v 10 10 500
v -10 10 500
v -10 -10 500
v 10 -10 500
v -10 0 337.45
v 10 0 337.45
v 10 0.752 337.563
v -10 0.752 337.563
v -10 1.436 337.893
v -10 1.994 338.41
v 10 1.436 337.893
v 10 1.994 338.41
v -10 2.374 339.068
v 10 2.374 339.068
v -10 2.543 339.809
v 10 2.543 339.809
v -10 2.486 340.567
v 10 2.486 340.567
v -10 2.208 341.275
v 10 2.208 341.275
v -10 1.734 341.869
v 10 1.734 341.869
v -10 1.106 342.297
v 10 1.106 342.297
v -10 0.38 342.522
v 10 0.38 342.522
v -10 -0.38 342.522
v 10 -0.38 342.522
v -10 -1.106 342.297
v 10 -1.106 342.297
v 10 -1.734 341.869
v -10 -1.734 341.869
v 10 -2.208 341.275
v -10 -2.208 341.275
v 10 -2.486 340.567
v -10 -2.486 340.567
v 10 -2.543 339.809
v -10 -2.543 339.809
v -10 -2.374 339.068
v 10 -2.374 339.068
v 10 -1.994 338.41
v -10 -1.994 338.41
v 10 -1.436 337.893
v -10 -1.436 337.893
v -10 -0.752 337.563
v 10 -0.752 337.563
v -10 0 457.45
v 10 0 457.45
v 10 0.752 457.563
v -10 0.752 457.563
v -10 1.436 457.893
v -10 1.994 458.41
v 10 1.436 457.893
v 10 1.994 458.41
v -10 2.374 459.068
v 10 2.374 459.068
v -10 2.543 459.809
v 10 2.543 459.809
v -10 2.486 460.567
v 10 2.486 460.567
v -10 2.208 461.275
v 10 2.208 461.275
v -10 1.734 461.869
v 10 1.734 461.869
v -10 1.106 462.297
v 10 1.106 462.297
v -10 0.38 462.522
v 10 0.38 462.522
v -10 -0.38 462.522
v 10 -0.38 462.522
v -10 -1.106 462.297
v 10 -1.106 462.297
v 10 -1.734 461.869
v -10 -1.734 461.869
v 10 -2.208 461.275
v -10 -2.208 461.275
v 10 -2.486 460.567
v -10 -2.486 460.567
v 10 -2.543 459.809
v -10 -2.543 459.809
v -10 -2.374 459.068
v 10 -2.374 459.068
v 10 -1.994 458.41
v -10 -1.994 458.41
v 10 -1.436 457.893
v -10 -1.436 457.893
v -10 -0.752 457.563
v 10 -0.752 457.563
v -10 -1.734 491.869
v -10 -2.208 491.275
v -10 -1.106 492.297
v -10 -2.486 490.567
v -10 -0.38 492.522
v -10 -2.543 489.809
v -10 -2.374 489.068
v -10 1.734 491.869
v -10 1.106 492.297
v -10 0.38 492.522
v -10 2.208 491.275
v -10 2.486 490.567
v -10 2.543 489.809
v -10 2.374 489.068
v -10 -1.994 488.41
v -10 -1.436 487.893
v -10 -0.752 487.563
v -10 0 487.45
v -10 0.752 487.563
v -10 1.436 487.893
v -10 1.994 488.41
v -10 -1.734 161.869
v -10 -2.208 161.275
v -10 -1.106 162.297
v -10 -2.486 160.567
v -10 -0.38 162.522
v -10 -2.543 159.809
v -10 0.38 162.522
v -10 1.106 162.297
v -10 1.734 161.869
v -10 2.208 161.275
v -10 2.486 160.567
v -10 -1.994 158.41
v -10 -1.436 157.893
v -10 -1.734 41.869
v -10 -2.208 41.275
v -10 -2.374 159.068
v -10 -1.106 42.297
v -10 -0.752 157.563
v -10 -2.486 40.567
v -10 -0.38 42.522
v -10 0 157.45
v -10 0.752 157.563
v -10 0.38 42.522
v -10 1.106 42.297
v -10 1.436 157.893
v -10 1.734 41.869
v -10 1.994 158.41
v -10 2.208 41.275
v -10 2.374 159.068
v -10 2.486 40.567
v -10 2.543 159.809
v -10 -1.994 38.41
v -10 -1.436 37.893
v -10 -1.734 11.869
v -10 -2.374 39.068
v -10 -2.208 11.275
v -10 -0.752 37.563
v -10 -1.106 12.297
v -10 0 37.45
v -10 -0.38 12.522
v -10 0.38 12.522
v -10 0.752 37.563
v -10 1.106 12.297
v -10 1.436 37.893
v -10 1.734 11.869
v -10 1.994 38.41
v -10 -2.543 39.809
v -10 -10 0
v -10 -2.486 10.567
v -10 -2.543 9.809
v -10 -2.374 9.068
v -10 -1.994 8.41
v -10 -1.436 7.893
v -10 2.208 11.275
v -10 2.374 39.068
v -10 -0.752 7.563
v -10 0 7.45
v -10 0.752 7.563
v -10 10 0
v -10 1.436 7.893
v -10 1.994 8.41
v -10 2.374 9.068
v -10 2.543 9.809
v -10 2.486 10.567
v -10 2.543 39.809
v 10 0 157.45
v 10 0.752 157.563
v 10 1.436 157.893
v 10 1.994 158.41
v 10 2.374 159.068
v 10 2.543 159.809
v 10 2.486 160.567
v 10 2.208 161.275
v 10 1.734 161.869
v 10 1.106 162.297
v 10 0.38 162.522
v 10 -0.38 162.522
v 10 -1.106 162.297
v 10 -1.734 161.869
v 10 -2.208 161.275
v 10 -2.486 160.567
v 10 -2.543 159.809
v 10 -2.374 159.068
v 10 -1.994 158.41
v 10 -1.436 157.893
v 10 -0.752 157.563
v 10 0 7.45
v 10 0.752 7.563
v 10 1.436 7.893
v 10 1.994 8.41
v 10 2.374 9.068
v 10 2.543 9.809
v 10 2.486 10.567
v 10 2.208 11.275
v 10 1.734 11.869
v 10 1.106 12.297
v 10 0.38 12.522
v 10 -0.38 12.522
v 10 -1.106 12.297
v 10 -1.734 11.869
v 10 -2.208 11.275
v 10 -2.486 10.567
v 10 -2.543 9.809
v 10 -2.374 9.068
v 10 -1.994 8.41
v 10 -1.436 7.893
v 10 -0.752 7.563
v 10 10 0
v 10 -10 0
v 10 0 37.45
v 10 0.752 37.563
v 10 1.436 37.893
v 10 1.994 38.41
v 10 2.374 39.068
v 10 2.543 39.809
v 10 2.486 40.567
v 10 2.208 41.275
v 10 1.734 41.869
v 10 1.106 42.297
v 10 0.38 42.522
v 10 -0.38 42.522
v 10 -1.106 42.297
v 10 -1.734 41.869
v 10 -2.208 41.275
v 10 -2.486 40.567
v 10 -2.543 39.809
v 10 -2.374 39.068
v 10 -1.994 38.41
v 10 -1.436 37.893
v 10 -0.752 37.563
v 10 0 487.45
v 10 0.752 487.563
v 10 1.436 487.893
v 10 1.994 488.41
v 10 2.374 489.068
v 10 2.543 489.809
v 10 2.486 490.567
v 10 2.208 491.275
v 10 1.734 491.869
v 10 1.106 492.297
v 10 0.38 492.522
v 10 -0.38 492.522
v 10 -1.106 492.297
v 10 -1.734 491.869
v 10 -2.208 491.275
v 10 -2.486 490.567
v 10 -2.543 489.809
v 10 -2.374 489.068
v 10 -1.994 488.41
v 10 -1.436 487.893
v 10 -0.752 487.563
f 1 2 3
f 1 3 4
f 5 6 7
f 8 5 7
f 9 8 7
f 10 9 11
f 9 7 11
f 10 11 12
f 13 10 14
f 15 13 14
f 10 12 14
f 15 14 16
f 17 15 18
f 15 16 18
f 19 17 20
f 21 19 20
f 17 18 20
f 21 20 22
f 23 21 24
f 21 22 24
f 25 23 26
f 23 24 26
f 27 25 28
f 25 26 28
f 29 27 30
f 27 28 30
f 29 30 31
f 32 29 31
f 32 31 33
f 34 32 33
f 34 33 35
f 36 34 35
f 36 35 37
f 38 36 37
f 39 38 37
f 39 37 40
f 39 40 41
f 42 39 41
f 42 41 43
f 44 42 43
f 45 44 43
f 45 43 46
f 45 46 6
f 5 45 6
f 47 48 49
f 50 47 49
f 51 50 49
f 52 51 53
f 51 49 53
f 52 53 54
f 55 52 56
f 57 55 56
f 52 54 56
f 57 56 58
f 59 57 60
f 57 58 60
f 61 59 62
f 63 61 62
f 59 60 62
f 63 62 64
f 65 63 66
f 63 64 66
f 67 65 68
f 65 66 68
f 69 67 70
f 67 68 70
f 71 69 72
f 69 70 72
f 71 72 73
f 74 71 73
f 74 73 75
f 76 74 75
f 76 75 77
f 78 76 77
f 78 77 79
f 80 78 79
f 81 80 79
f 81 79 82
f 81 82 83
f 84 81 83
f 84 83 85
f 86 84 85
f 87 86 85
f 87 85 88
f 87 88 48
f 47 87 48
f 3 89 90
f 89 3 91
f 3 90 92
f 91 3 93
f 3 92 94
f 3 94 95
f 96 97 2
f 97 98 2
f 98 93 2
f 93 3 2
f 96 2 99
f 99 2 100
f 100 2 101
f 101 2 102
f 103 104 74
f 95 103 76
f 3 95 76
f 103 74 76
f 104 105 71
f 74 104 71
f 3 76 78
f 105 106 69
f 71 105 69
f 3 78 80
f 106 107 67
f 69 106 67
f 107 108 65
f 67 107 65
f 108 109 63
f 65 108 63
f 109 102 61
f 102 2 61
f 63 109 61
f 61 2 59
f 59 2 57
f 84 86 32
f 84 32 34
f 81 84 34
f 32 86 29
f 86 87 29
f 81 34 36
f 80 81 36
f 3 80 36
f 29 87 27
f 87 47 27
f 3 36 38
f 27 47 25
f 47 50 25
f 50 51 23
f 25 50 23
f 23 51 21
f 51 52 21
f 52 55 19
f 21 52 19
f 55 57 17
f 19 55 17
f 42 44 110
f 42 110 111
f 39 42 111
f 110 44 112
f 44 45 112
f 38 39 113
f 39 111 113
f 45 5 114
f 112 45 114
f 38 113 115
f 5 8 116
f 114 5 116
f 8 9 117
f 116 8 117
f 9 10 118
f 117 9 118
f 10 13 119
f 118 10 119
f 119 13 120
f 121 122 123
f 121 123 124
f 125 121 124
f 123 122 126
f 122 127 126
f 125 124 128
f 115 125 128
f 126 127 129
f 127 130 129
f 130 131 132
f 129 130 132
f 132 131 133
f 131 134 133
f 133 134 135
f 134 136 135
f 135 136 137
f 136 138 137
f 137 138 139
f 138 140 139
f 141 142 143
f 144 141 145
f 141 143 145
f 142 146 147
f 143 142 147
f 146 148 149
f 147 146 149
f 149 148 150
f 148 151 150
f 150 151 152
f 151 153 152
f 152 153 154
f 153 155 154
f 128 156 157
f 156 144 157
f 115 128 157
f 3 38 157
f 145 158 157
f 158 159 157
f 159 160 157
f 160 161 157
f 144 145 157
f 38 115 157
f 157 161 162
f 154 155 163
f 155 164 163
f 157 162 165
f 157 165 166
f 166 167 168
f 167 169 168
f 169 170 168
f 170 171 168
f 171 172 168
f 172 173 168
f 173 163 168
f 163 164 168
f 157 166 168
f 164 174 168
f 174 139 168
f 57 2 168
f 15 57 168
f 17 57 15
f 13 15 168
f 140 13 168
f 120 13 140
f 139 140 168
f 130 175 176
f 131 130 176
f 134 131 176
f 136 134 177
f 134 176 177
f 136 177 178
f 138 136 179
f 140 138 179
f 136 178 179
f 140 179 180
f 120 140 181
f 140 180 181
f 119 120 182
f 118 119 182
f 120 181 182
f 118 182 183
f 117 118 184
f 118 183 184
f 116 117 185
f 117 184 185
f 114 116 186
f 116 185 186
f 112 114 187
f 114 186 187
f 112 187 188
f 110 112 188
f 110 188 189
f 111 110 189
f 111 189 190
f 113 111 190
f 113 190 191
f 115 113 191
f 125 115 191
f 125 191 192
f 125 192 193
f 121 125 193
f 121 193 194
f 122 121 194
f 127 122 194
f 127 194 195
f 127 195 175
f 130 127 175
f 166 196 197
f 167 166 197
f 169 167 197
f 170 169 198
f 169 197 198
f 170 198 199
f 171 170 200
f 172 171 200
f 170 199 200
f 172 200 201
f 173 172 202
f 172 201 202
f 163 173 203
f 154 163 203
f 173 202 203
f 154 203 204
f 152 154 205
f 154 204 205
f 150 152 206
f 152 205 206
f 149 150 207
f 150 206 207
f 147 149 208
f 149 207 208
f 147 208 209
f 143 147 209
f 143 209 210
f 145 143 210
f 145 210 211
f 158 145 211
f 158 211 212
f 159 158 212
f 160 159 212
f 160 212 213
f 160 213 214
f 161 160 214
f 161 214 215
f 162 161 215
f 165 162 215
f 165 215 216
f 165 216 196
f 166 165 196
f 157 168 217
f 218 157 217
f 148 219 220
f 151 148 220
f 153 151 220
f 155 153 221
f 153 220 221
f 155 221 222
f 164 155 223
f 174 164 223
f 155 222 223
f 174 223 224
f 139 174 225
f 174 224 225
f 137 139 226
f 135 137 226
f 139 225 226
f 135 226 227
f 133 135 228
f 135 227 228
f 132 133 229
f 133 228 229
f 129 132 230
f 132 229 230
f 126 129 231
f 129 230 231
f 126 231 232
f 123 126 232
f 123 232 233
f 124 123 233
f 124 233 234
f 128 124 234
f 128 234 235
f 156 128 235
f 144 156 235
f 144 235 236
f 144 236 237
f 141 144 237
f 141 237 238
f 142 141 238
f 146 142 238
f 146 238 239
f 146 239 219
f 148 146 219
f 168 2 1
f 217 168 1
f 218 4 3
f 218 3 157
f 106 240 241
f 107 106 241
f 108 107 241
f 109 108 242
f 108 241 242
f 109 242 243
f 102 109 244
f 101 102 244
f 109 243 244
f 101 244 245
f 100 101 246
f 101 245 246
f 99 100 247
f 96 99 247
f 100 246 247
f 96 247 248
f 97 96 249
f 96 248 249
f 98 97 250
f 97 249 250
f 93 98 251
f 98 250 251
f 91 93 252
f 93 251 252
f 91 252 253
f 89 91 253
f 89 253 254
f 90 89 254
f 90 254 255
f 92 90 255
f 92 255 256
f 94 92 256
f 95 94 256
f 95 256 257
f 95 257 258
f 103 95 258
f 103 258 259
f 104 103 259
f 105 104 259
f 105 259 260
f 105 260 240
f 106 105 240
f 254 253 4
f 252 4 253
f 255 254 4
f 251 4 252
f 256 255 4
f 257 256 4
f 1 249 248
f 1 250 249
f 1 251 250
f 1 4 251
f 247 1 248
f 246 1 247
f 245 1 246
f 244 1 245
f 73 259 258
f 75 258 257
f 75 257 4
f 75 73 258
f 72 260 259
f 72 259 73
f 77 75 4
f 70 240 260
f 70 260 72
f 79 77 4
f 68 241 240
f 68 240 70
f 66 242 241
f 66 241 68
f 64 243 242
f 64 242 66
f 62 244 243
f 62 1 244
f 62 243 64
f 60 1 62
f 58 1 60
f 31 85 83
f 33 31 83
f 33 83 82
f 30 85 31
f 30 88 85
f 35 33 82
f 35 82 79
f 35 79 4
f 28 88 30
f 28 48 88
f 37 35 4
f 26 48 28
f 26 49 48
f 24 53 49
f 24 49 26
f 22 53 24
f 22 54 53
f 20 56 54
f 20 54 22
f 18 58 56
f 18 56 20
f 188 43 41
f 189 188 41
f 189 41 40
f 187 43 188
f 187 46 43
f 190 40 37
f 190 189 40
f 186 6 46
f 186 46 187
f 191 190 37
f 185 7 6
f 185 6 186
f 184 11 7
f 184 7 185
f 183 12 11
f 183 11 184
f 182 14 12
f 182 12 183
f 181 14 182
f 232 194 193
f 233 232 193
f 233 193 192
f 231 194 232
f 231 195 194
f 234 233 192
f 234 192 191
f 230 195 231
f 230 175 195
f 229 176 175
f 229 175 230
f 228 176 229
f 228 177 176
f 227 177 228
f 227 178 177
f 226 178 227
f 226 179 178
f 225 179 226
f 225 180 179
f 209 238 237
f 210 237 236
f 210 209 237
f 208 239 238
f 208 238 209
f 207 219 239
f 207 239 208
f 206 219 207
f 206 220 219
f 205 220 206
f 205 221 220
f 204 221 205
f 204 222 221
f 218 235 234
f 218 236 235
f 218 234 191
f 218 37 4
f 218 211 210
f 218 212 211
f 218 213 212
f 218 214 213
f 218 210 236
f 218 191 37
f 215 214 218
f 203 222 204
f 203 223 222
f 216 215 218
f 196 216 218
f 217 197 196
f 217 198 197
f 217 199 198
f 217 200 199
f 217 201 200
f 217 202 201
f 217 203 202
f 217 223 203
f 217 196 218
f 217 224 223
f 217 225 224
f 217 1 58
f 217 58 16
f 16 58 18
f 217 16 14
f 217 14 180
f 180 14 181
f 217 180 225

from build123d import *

# Parameters (mm, degrees)
SKETCH_1_W          = 20
SKETCH_1_H          = 20
EXTRUDE_2_DEPTH     = 500
CUT_EXTRUDE_1_REACH = 502.5
SKETCH_2_R          = 2.55
SKETCH_3_W          = 20
SKETCH_3_H          = 50
EXTRUDE_3_DEPTH     = 20
SKETCH_4_R          = 2.55
CUT_EXTRUDE_2_DEPTH = 20
SKETCH_5_W          = 20
SKETCH_5_H          = 20
CUT_EXTRUDE_3_DEPTH = 250
CUT_EXTRUDE_4_REACH = 503.298
SKETCH_6_R          = 2.55
SKETCH_7_W          = 50
SKETCH_7_H          = 20
CUT_EXTRUDE_5_DEPTH = 250
CUT_EXTRUDE_6_REACH = 502.5
SKETCH_8_R          = 2.55


with BuildPart() as part:
    # 草图1 → 凸台-拉伸2 (new body)
    with BuildSketch(Plane.XY):
        Rectangle(SKETCH_1_W, SKETCH_1_H)
    extrude_2 = extrude(amount=EXTRUDE_2_DEPTH)

    # 草图2 → 切除-拉伸1 (cut, up to next)
    with BuildSketch(Plane(origin=(10, 0, 0), x_dir=(0, 0, -1), z_dir=(1, 0, 0)), mode=Mode.PRIVATE) as cut_extrude_1_sk1:
        with Locations((-10, 0)):
            Circle(SKETCH_2_R)
    cut_extrude_1_tool1 = extrude(cut_extrude_1_sk1.sketch, amount=-CUT_EXTRUDE_1_REACH, mode=Mode.PRIVATE) & part.part
    # 草图2 → 切除-拉伸1 (cut, up to next)
    with BuildSketch(Plane(origin=(10, 0, 0), x_dir=(0, 0, -1), z_dir=(1, 0, 0)), mode=Mode.PRIVATE) as cut_extrude_1_sk2:
        with Locations((-40, 0)):
            Circle(SKETCH_2_R)
    cut_extrude_1_tool2 = extrude(cut_extrude_1_sk2.sketch, amount=-CUT_EXTRUDE_1_REACH, mode=Mode.PRIVATE) & part.part
    add(cut_extrude_1_tool1.solids().sort_by_distance((10, 0, 10))[0], mode=Mode.SUBTRACT)
    add(cut_extrude_1_tool2.solids().sort_by_distance((10, 0, 40))[0], mode=Mode.SUBTRACT)

    # 草图3 → 凸台-拉伸3 (add)
    with BuildSketch(Plane.XZ.offset(10)):
        with Locations((0, 25)):
            Rectangle(SKETCH_3_W, SKETCH_3_H)
    extrude_3 = extrude(amount=EXTRUDE_3_DEPTH)

    # 草图4 → 切除-拉伸2 (cut)
    with BuildSketch(Plane(origin=(10, 0, 0), x_dir=(0, 0, -1), z_dir=(1, 0, 0))):
        with Locations((-40, -20)):
            Circle(SKETCH_4_R)
        with Locations((-10, -20)):
            Circle(SKETCH_4_R)
    extrude(amount=-CUT_EXTRUDE_2_DEPTH, mode=Mode.SUBTRACT)

    # 草图5 → 切除-拉伸3 (cut)
    with BuildSketch(Plane.XY.offset(500)):
        Rectangle(SKETCH_5_W, SKETCH_5_H)
    extrude(amount=-CUT_EXTRUDE_3_DEPTH, mode=Mode.SUBTRACT)

    # 镜向2: 凸台-拉伸2, 凸台-拉伸3 across plane
    add(extrude_2.mirror(Plane(origin=(0, 0, 250), x_dir=(1, 0, 0), z_dir=(0, 0, -1))))
    add(extrude_3.mirror(Plane(origin=(0, 0, 250), x_dir=(1, 0, 0), z_dir=(0, 0, -1))))

    # 草图6 → 切除-拉伸4 (cut, up to next)
    with BuildSketch(Plane(origin=(10, 0, 0), x_dir=(0, 0, -1), z_dir=(1, 0, 0)), mode=Mode.PRIVATE) as cut_extrude_4_sk1:
        with Locations((-490, 0)):
            Circle(SKETCH_6_R)
    cut_extrude_4_tool1 = extrude(cut_extrude_4_sk1.sketch, amount=-CUT_EXTRUDE_4_REACH, mode=Mode.PRIVATE) & part.part
    # 草图6 → 切除-拉伸4 (cut, up to next)
    with BuildSketch(Plane(origin=(10, 0, 0), x_dir=(0, 0, -1), z_dir=(1, 0, 0)), mode=Mode.PRIVATE) as cut_extrude_4_sk2:
        with Locations((-460, 0)):
            Circle(SKETCH_6_R)
    cut_extrude_4_tool2 = extrude(cut_extrude_4_sk2.sketch, amount=-CUT_EXTRUDE_4_REACH, mode=Mode.PRIVATE) & part.part
    # 草图6 → 切除-拉伸4 (cut, up to next)
    with BuildSketch(Plane(origin=(10, 0, 0), x_dir=(0, 0, -1), z_dir=(1, 0, 0)), mode=Mode.PRIVATE) as cut_extrude_4_sk3:
        with Locations((-460, -20)):
            Circle(SKETCH_6_R)
    cut_extrude_4_tool3 = extrude(cut_extrude_4_sk3.sketch, amount=-CUT_EXTRUDE_4_REACH, mode=Mode.PRIVATE) & part.part
    # 草图6 → 切除-拉伸4 (cut, up to next)
    with BuildSketch(Plane(origin=(10, 0, 0), x_dir=(0, 0, -1), z_dir=(1, 0, 0)), mode=Mode.PRIVATE) as cut_extrude_4_sk4:
        with Locations((-490, -20)):
            Circle(SKETCH_6_R)
    cut_extrude_4_tool4 = extrude(cut_extrude_4_sk4.sketch, amount=-CUT_EXTRUDE_4_REACH, mode=Mode.PRIVATE) & part.part
    # 草图6 → 切除-拉伸4 (cut, up to next)
    with BuildSketch(Plane(origin=(10, 0, 0), x_dir=(0, 0, -1), z_dir=(1, 0, 0)), mode=Mode.PRIVATE) as cut_extrude_4_sk5:
        with Locations((-10, 0)):
            Circle(SKETCH_6_R)
    cut_extrude_4_tool5 = extrude(cut_extrude_4_sk5.sketch, amount=-CUT_EXTRUDE_4_REACH, mode=Mode.PRIVATE) & part.part
    # 草图6 → 切除-拉伸4 (cut, up to next)
    with BuildSketch(Plane(origin=(10, 0, 0), x_dir=(0, 0, -1), z_dir=(1, 0, 0)), mode=Mode.PRIVATE) as cut_extrude_4_sk6:
        with Locations((-40, 0)):
            Circle(SKETCH_6_R)
    cut_extrude_4_tool6 = extrude(cut_extrude_4_sk6.sketch, amount=-CUT_EXTRUDE_4_REACH, mode=Mode.PRIVATE) & part.part
    add(cut_extrude_4_tool1.solids().sort_by_distance((10, 0, 490))[0], mode=Mode.SUBTRACT)
    add(cut_extrude_4_tool2.solids().sort_by_distance((10, 0, 460))[0], mode=Mode.SUBTRACT)
    add(cut_extrude_4_tool3.solids().sort_by_distance((10, -20, 460))[0], mode=Mode.SUBTRACT)
    add(cut_extrude_4_tool4.solids().sort_by_distance((10, -20, 490))[0], mode=Mode.SUBTRACT)
    add(cut_extrude_4_tool5.solids().sort_by_distance((10, 0, 10))[0], mode=Mode.SUBTRACT)
    add(cut_extrude_4_tool6.solids().sort_by_distance((10, 0, 40))[0], mode=Mode.SUBTRACT)

    # 草图7 → 切除-拉伸5 (cut)
    with BuildSketch(Plane(origin=(10, 0, 0), x_dir=(0, 0, -1), z_dir=(1, 0, 0))):
        with Locations((-475, -20)):
            Rectangle(SKETCH_7_W, SKETCH_7_H)
        with Locations((-25, -20)):
            Rectangle(SKETCH_7_W, SKETCH_7_H)
    extrude(amount=-CUT_EXTRUDE_5_DEPTH, mode=Mode.SUBTRACT)

    # 草图8 → 切除-拉伸6 (cut, up to next)
    with BuildSketch(Plane(origin=(10, 0, 0), x_dir=(0, 0, -1), z_dir=(1, 0, 0)), mode=Mode.PRIVATE) as cut_extrude_6_sk1:
        with Locations((-340, 0)):
            Circle(SKETCH_8_R)
    cut_extrude_6_tool1 = extrude(cut_extrude_6_sk1.sketch, amount=-CUT_EXTRUDE_6_REACH, mode=Mode.PRIVATE) & part.part
    # 草图8 → 切除-拉伸6 (cut, up to next)
    with BuildSketch(Plane(origin=(10, 0, 0), x_dir=(0, 0, -1), z_dir=(1, 0, 0)), mode=Mode.PRIVATE) as cut_extrude_6_sk2:
        with Locations((-160, 0)):
            Circle(SKETCH_8_R)
    cut_extrude_6_tool2 = extrude(cut_extrude_6_sk2.sketch, amount=-CUT_EXTRUDE_6_REACH, mode=Mode.PRIVATE) & part.part
    add(cut_extrude_6_tool1.solids().sort_by_distance((10, 0, 340))[0], mode=Mode.SUBTRACT)
    add(cut_extrude_6_tool2.solids().sort_by_distance((10, 0, 160))[0], mode=Mode.SUBTRACT)


solid = part.part
